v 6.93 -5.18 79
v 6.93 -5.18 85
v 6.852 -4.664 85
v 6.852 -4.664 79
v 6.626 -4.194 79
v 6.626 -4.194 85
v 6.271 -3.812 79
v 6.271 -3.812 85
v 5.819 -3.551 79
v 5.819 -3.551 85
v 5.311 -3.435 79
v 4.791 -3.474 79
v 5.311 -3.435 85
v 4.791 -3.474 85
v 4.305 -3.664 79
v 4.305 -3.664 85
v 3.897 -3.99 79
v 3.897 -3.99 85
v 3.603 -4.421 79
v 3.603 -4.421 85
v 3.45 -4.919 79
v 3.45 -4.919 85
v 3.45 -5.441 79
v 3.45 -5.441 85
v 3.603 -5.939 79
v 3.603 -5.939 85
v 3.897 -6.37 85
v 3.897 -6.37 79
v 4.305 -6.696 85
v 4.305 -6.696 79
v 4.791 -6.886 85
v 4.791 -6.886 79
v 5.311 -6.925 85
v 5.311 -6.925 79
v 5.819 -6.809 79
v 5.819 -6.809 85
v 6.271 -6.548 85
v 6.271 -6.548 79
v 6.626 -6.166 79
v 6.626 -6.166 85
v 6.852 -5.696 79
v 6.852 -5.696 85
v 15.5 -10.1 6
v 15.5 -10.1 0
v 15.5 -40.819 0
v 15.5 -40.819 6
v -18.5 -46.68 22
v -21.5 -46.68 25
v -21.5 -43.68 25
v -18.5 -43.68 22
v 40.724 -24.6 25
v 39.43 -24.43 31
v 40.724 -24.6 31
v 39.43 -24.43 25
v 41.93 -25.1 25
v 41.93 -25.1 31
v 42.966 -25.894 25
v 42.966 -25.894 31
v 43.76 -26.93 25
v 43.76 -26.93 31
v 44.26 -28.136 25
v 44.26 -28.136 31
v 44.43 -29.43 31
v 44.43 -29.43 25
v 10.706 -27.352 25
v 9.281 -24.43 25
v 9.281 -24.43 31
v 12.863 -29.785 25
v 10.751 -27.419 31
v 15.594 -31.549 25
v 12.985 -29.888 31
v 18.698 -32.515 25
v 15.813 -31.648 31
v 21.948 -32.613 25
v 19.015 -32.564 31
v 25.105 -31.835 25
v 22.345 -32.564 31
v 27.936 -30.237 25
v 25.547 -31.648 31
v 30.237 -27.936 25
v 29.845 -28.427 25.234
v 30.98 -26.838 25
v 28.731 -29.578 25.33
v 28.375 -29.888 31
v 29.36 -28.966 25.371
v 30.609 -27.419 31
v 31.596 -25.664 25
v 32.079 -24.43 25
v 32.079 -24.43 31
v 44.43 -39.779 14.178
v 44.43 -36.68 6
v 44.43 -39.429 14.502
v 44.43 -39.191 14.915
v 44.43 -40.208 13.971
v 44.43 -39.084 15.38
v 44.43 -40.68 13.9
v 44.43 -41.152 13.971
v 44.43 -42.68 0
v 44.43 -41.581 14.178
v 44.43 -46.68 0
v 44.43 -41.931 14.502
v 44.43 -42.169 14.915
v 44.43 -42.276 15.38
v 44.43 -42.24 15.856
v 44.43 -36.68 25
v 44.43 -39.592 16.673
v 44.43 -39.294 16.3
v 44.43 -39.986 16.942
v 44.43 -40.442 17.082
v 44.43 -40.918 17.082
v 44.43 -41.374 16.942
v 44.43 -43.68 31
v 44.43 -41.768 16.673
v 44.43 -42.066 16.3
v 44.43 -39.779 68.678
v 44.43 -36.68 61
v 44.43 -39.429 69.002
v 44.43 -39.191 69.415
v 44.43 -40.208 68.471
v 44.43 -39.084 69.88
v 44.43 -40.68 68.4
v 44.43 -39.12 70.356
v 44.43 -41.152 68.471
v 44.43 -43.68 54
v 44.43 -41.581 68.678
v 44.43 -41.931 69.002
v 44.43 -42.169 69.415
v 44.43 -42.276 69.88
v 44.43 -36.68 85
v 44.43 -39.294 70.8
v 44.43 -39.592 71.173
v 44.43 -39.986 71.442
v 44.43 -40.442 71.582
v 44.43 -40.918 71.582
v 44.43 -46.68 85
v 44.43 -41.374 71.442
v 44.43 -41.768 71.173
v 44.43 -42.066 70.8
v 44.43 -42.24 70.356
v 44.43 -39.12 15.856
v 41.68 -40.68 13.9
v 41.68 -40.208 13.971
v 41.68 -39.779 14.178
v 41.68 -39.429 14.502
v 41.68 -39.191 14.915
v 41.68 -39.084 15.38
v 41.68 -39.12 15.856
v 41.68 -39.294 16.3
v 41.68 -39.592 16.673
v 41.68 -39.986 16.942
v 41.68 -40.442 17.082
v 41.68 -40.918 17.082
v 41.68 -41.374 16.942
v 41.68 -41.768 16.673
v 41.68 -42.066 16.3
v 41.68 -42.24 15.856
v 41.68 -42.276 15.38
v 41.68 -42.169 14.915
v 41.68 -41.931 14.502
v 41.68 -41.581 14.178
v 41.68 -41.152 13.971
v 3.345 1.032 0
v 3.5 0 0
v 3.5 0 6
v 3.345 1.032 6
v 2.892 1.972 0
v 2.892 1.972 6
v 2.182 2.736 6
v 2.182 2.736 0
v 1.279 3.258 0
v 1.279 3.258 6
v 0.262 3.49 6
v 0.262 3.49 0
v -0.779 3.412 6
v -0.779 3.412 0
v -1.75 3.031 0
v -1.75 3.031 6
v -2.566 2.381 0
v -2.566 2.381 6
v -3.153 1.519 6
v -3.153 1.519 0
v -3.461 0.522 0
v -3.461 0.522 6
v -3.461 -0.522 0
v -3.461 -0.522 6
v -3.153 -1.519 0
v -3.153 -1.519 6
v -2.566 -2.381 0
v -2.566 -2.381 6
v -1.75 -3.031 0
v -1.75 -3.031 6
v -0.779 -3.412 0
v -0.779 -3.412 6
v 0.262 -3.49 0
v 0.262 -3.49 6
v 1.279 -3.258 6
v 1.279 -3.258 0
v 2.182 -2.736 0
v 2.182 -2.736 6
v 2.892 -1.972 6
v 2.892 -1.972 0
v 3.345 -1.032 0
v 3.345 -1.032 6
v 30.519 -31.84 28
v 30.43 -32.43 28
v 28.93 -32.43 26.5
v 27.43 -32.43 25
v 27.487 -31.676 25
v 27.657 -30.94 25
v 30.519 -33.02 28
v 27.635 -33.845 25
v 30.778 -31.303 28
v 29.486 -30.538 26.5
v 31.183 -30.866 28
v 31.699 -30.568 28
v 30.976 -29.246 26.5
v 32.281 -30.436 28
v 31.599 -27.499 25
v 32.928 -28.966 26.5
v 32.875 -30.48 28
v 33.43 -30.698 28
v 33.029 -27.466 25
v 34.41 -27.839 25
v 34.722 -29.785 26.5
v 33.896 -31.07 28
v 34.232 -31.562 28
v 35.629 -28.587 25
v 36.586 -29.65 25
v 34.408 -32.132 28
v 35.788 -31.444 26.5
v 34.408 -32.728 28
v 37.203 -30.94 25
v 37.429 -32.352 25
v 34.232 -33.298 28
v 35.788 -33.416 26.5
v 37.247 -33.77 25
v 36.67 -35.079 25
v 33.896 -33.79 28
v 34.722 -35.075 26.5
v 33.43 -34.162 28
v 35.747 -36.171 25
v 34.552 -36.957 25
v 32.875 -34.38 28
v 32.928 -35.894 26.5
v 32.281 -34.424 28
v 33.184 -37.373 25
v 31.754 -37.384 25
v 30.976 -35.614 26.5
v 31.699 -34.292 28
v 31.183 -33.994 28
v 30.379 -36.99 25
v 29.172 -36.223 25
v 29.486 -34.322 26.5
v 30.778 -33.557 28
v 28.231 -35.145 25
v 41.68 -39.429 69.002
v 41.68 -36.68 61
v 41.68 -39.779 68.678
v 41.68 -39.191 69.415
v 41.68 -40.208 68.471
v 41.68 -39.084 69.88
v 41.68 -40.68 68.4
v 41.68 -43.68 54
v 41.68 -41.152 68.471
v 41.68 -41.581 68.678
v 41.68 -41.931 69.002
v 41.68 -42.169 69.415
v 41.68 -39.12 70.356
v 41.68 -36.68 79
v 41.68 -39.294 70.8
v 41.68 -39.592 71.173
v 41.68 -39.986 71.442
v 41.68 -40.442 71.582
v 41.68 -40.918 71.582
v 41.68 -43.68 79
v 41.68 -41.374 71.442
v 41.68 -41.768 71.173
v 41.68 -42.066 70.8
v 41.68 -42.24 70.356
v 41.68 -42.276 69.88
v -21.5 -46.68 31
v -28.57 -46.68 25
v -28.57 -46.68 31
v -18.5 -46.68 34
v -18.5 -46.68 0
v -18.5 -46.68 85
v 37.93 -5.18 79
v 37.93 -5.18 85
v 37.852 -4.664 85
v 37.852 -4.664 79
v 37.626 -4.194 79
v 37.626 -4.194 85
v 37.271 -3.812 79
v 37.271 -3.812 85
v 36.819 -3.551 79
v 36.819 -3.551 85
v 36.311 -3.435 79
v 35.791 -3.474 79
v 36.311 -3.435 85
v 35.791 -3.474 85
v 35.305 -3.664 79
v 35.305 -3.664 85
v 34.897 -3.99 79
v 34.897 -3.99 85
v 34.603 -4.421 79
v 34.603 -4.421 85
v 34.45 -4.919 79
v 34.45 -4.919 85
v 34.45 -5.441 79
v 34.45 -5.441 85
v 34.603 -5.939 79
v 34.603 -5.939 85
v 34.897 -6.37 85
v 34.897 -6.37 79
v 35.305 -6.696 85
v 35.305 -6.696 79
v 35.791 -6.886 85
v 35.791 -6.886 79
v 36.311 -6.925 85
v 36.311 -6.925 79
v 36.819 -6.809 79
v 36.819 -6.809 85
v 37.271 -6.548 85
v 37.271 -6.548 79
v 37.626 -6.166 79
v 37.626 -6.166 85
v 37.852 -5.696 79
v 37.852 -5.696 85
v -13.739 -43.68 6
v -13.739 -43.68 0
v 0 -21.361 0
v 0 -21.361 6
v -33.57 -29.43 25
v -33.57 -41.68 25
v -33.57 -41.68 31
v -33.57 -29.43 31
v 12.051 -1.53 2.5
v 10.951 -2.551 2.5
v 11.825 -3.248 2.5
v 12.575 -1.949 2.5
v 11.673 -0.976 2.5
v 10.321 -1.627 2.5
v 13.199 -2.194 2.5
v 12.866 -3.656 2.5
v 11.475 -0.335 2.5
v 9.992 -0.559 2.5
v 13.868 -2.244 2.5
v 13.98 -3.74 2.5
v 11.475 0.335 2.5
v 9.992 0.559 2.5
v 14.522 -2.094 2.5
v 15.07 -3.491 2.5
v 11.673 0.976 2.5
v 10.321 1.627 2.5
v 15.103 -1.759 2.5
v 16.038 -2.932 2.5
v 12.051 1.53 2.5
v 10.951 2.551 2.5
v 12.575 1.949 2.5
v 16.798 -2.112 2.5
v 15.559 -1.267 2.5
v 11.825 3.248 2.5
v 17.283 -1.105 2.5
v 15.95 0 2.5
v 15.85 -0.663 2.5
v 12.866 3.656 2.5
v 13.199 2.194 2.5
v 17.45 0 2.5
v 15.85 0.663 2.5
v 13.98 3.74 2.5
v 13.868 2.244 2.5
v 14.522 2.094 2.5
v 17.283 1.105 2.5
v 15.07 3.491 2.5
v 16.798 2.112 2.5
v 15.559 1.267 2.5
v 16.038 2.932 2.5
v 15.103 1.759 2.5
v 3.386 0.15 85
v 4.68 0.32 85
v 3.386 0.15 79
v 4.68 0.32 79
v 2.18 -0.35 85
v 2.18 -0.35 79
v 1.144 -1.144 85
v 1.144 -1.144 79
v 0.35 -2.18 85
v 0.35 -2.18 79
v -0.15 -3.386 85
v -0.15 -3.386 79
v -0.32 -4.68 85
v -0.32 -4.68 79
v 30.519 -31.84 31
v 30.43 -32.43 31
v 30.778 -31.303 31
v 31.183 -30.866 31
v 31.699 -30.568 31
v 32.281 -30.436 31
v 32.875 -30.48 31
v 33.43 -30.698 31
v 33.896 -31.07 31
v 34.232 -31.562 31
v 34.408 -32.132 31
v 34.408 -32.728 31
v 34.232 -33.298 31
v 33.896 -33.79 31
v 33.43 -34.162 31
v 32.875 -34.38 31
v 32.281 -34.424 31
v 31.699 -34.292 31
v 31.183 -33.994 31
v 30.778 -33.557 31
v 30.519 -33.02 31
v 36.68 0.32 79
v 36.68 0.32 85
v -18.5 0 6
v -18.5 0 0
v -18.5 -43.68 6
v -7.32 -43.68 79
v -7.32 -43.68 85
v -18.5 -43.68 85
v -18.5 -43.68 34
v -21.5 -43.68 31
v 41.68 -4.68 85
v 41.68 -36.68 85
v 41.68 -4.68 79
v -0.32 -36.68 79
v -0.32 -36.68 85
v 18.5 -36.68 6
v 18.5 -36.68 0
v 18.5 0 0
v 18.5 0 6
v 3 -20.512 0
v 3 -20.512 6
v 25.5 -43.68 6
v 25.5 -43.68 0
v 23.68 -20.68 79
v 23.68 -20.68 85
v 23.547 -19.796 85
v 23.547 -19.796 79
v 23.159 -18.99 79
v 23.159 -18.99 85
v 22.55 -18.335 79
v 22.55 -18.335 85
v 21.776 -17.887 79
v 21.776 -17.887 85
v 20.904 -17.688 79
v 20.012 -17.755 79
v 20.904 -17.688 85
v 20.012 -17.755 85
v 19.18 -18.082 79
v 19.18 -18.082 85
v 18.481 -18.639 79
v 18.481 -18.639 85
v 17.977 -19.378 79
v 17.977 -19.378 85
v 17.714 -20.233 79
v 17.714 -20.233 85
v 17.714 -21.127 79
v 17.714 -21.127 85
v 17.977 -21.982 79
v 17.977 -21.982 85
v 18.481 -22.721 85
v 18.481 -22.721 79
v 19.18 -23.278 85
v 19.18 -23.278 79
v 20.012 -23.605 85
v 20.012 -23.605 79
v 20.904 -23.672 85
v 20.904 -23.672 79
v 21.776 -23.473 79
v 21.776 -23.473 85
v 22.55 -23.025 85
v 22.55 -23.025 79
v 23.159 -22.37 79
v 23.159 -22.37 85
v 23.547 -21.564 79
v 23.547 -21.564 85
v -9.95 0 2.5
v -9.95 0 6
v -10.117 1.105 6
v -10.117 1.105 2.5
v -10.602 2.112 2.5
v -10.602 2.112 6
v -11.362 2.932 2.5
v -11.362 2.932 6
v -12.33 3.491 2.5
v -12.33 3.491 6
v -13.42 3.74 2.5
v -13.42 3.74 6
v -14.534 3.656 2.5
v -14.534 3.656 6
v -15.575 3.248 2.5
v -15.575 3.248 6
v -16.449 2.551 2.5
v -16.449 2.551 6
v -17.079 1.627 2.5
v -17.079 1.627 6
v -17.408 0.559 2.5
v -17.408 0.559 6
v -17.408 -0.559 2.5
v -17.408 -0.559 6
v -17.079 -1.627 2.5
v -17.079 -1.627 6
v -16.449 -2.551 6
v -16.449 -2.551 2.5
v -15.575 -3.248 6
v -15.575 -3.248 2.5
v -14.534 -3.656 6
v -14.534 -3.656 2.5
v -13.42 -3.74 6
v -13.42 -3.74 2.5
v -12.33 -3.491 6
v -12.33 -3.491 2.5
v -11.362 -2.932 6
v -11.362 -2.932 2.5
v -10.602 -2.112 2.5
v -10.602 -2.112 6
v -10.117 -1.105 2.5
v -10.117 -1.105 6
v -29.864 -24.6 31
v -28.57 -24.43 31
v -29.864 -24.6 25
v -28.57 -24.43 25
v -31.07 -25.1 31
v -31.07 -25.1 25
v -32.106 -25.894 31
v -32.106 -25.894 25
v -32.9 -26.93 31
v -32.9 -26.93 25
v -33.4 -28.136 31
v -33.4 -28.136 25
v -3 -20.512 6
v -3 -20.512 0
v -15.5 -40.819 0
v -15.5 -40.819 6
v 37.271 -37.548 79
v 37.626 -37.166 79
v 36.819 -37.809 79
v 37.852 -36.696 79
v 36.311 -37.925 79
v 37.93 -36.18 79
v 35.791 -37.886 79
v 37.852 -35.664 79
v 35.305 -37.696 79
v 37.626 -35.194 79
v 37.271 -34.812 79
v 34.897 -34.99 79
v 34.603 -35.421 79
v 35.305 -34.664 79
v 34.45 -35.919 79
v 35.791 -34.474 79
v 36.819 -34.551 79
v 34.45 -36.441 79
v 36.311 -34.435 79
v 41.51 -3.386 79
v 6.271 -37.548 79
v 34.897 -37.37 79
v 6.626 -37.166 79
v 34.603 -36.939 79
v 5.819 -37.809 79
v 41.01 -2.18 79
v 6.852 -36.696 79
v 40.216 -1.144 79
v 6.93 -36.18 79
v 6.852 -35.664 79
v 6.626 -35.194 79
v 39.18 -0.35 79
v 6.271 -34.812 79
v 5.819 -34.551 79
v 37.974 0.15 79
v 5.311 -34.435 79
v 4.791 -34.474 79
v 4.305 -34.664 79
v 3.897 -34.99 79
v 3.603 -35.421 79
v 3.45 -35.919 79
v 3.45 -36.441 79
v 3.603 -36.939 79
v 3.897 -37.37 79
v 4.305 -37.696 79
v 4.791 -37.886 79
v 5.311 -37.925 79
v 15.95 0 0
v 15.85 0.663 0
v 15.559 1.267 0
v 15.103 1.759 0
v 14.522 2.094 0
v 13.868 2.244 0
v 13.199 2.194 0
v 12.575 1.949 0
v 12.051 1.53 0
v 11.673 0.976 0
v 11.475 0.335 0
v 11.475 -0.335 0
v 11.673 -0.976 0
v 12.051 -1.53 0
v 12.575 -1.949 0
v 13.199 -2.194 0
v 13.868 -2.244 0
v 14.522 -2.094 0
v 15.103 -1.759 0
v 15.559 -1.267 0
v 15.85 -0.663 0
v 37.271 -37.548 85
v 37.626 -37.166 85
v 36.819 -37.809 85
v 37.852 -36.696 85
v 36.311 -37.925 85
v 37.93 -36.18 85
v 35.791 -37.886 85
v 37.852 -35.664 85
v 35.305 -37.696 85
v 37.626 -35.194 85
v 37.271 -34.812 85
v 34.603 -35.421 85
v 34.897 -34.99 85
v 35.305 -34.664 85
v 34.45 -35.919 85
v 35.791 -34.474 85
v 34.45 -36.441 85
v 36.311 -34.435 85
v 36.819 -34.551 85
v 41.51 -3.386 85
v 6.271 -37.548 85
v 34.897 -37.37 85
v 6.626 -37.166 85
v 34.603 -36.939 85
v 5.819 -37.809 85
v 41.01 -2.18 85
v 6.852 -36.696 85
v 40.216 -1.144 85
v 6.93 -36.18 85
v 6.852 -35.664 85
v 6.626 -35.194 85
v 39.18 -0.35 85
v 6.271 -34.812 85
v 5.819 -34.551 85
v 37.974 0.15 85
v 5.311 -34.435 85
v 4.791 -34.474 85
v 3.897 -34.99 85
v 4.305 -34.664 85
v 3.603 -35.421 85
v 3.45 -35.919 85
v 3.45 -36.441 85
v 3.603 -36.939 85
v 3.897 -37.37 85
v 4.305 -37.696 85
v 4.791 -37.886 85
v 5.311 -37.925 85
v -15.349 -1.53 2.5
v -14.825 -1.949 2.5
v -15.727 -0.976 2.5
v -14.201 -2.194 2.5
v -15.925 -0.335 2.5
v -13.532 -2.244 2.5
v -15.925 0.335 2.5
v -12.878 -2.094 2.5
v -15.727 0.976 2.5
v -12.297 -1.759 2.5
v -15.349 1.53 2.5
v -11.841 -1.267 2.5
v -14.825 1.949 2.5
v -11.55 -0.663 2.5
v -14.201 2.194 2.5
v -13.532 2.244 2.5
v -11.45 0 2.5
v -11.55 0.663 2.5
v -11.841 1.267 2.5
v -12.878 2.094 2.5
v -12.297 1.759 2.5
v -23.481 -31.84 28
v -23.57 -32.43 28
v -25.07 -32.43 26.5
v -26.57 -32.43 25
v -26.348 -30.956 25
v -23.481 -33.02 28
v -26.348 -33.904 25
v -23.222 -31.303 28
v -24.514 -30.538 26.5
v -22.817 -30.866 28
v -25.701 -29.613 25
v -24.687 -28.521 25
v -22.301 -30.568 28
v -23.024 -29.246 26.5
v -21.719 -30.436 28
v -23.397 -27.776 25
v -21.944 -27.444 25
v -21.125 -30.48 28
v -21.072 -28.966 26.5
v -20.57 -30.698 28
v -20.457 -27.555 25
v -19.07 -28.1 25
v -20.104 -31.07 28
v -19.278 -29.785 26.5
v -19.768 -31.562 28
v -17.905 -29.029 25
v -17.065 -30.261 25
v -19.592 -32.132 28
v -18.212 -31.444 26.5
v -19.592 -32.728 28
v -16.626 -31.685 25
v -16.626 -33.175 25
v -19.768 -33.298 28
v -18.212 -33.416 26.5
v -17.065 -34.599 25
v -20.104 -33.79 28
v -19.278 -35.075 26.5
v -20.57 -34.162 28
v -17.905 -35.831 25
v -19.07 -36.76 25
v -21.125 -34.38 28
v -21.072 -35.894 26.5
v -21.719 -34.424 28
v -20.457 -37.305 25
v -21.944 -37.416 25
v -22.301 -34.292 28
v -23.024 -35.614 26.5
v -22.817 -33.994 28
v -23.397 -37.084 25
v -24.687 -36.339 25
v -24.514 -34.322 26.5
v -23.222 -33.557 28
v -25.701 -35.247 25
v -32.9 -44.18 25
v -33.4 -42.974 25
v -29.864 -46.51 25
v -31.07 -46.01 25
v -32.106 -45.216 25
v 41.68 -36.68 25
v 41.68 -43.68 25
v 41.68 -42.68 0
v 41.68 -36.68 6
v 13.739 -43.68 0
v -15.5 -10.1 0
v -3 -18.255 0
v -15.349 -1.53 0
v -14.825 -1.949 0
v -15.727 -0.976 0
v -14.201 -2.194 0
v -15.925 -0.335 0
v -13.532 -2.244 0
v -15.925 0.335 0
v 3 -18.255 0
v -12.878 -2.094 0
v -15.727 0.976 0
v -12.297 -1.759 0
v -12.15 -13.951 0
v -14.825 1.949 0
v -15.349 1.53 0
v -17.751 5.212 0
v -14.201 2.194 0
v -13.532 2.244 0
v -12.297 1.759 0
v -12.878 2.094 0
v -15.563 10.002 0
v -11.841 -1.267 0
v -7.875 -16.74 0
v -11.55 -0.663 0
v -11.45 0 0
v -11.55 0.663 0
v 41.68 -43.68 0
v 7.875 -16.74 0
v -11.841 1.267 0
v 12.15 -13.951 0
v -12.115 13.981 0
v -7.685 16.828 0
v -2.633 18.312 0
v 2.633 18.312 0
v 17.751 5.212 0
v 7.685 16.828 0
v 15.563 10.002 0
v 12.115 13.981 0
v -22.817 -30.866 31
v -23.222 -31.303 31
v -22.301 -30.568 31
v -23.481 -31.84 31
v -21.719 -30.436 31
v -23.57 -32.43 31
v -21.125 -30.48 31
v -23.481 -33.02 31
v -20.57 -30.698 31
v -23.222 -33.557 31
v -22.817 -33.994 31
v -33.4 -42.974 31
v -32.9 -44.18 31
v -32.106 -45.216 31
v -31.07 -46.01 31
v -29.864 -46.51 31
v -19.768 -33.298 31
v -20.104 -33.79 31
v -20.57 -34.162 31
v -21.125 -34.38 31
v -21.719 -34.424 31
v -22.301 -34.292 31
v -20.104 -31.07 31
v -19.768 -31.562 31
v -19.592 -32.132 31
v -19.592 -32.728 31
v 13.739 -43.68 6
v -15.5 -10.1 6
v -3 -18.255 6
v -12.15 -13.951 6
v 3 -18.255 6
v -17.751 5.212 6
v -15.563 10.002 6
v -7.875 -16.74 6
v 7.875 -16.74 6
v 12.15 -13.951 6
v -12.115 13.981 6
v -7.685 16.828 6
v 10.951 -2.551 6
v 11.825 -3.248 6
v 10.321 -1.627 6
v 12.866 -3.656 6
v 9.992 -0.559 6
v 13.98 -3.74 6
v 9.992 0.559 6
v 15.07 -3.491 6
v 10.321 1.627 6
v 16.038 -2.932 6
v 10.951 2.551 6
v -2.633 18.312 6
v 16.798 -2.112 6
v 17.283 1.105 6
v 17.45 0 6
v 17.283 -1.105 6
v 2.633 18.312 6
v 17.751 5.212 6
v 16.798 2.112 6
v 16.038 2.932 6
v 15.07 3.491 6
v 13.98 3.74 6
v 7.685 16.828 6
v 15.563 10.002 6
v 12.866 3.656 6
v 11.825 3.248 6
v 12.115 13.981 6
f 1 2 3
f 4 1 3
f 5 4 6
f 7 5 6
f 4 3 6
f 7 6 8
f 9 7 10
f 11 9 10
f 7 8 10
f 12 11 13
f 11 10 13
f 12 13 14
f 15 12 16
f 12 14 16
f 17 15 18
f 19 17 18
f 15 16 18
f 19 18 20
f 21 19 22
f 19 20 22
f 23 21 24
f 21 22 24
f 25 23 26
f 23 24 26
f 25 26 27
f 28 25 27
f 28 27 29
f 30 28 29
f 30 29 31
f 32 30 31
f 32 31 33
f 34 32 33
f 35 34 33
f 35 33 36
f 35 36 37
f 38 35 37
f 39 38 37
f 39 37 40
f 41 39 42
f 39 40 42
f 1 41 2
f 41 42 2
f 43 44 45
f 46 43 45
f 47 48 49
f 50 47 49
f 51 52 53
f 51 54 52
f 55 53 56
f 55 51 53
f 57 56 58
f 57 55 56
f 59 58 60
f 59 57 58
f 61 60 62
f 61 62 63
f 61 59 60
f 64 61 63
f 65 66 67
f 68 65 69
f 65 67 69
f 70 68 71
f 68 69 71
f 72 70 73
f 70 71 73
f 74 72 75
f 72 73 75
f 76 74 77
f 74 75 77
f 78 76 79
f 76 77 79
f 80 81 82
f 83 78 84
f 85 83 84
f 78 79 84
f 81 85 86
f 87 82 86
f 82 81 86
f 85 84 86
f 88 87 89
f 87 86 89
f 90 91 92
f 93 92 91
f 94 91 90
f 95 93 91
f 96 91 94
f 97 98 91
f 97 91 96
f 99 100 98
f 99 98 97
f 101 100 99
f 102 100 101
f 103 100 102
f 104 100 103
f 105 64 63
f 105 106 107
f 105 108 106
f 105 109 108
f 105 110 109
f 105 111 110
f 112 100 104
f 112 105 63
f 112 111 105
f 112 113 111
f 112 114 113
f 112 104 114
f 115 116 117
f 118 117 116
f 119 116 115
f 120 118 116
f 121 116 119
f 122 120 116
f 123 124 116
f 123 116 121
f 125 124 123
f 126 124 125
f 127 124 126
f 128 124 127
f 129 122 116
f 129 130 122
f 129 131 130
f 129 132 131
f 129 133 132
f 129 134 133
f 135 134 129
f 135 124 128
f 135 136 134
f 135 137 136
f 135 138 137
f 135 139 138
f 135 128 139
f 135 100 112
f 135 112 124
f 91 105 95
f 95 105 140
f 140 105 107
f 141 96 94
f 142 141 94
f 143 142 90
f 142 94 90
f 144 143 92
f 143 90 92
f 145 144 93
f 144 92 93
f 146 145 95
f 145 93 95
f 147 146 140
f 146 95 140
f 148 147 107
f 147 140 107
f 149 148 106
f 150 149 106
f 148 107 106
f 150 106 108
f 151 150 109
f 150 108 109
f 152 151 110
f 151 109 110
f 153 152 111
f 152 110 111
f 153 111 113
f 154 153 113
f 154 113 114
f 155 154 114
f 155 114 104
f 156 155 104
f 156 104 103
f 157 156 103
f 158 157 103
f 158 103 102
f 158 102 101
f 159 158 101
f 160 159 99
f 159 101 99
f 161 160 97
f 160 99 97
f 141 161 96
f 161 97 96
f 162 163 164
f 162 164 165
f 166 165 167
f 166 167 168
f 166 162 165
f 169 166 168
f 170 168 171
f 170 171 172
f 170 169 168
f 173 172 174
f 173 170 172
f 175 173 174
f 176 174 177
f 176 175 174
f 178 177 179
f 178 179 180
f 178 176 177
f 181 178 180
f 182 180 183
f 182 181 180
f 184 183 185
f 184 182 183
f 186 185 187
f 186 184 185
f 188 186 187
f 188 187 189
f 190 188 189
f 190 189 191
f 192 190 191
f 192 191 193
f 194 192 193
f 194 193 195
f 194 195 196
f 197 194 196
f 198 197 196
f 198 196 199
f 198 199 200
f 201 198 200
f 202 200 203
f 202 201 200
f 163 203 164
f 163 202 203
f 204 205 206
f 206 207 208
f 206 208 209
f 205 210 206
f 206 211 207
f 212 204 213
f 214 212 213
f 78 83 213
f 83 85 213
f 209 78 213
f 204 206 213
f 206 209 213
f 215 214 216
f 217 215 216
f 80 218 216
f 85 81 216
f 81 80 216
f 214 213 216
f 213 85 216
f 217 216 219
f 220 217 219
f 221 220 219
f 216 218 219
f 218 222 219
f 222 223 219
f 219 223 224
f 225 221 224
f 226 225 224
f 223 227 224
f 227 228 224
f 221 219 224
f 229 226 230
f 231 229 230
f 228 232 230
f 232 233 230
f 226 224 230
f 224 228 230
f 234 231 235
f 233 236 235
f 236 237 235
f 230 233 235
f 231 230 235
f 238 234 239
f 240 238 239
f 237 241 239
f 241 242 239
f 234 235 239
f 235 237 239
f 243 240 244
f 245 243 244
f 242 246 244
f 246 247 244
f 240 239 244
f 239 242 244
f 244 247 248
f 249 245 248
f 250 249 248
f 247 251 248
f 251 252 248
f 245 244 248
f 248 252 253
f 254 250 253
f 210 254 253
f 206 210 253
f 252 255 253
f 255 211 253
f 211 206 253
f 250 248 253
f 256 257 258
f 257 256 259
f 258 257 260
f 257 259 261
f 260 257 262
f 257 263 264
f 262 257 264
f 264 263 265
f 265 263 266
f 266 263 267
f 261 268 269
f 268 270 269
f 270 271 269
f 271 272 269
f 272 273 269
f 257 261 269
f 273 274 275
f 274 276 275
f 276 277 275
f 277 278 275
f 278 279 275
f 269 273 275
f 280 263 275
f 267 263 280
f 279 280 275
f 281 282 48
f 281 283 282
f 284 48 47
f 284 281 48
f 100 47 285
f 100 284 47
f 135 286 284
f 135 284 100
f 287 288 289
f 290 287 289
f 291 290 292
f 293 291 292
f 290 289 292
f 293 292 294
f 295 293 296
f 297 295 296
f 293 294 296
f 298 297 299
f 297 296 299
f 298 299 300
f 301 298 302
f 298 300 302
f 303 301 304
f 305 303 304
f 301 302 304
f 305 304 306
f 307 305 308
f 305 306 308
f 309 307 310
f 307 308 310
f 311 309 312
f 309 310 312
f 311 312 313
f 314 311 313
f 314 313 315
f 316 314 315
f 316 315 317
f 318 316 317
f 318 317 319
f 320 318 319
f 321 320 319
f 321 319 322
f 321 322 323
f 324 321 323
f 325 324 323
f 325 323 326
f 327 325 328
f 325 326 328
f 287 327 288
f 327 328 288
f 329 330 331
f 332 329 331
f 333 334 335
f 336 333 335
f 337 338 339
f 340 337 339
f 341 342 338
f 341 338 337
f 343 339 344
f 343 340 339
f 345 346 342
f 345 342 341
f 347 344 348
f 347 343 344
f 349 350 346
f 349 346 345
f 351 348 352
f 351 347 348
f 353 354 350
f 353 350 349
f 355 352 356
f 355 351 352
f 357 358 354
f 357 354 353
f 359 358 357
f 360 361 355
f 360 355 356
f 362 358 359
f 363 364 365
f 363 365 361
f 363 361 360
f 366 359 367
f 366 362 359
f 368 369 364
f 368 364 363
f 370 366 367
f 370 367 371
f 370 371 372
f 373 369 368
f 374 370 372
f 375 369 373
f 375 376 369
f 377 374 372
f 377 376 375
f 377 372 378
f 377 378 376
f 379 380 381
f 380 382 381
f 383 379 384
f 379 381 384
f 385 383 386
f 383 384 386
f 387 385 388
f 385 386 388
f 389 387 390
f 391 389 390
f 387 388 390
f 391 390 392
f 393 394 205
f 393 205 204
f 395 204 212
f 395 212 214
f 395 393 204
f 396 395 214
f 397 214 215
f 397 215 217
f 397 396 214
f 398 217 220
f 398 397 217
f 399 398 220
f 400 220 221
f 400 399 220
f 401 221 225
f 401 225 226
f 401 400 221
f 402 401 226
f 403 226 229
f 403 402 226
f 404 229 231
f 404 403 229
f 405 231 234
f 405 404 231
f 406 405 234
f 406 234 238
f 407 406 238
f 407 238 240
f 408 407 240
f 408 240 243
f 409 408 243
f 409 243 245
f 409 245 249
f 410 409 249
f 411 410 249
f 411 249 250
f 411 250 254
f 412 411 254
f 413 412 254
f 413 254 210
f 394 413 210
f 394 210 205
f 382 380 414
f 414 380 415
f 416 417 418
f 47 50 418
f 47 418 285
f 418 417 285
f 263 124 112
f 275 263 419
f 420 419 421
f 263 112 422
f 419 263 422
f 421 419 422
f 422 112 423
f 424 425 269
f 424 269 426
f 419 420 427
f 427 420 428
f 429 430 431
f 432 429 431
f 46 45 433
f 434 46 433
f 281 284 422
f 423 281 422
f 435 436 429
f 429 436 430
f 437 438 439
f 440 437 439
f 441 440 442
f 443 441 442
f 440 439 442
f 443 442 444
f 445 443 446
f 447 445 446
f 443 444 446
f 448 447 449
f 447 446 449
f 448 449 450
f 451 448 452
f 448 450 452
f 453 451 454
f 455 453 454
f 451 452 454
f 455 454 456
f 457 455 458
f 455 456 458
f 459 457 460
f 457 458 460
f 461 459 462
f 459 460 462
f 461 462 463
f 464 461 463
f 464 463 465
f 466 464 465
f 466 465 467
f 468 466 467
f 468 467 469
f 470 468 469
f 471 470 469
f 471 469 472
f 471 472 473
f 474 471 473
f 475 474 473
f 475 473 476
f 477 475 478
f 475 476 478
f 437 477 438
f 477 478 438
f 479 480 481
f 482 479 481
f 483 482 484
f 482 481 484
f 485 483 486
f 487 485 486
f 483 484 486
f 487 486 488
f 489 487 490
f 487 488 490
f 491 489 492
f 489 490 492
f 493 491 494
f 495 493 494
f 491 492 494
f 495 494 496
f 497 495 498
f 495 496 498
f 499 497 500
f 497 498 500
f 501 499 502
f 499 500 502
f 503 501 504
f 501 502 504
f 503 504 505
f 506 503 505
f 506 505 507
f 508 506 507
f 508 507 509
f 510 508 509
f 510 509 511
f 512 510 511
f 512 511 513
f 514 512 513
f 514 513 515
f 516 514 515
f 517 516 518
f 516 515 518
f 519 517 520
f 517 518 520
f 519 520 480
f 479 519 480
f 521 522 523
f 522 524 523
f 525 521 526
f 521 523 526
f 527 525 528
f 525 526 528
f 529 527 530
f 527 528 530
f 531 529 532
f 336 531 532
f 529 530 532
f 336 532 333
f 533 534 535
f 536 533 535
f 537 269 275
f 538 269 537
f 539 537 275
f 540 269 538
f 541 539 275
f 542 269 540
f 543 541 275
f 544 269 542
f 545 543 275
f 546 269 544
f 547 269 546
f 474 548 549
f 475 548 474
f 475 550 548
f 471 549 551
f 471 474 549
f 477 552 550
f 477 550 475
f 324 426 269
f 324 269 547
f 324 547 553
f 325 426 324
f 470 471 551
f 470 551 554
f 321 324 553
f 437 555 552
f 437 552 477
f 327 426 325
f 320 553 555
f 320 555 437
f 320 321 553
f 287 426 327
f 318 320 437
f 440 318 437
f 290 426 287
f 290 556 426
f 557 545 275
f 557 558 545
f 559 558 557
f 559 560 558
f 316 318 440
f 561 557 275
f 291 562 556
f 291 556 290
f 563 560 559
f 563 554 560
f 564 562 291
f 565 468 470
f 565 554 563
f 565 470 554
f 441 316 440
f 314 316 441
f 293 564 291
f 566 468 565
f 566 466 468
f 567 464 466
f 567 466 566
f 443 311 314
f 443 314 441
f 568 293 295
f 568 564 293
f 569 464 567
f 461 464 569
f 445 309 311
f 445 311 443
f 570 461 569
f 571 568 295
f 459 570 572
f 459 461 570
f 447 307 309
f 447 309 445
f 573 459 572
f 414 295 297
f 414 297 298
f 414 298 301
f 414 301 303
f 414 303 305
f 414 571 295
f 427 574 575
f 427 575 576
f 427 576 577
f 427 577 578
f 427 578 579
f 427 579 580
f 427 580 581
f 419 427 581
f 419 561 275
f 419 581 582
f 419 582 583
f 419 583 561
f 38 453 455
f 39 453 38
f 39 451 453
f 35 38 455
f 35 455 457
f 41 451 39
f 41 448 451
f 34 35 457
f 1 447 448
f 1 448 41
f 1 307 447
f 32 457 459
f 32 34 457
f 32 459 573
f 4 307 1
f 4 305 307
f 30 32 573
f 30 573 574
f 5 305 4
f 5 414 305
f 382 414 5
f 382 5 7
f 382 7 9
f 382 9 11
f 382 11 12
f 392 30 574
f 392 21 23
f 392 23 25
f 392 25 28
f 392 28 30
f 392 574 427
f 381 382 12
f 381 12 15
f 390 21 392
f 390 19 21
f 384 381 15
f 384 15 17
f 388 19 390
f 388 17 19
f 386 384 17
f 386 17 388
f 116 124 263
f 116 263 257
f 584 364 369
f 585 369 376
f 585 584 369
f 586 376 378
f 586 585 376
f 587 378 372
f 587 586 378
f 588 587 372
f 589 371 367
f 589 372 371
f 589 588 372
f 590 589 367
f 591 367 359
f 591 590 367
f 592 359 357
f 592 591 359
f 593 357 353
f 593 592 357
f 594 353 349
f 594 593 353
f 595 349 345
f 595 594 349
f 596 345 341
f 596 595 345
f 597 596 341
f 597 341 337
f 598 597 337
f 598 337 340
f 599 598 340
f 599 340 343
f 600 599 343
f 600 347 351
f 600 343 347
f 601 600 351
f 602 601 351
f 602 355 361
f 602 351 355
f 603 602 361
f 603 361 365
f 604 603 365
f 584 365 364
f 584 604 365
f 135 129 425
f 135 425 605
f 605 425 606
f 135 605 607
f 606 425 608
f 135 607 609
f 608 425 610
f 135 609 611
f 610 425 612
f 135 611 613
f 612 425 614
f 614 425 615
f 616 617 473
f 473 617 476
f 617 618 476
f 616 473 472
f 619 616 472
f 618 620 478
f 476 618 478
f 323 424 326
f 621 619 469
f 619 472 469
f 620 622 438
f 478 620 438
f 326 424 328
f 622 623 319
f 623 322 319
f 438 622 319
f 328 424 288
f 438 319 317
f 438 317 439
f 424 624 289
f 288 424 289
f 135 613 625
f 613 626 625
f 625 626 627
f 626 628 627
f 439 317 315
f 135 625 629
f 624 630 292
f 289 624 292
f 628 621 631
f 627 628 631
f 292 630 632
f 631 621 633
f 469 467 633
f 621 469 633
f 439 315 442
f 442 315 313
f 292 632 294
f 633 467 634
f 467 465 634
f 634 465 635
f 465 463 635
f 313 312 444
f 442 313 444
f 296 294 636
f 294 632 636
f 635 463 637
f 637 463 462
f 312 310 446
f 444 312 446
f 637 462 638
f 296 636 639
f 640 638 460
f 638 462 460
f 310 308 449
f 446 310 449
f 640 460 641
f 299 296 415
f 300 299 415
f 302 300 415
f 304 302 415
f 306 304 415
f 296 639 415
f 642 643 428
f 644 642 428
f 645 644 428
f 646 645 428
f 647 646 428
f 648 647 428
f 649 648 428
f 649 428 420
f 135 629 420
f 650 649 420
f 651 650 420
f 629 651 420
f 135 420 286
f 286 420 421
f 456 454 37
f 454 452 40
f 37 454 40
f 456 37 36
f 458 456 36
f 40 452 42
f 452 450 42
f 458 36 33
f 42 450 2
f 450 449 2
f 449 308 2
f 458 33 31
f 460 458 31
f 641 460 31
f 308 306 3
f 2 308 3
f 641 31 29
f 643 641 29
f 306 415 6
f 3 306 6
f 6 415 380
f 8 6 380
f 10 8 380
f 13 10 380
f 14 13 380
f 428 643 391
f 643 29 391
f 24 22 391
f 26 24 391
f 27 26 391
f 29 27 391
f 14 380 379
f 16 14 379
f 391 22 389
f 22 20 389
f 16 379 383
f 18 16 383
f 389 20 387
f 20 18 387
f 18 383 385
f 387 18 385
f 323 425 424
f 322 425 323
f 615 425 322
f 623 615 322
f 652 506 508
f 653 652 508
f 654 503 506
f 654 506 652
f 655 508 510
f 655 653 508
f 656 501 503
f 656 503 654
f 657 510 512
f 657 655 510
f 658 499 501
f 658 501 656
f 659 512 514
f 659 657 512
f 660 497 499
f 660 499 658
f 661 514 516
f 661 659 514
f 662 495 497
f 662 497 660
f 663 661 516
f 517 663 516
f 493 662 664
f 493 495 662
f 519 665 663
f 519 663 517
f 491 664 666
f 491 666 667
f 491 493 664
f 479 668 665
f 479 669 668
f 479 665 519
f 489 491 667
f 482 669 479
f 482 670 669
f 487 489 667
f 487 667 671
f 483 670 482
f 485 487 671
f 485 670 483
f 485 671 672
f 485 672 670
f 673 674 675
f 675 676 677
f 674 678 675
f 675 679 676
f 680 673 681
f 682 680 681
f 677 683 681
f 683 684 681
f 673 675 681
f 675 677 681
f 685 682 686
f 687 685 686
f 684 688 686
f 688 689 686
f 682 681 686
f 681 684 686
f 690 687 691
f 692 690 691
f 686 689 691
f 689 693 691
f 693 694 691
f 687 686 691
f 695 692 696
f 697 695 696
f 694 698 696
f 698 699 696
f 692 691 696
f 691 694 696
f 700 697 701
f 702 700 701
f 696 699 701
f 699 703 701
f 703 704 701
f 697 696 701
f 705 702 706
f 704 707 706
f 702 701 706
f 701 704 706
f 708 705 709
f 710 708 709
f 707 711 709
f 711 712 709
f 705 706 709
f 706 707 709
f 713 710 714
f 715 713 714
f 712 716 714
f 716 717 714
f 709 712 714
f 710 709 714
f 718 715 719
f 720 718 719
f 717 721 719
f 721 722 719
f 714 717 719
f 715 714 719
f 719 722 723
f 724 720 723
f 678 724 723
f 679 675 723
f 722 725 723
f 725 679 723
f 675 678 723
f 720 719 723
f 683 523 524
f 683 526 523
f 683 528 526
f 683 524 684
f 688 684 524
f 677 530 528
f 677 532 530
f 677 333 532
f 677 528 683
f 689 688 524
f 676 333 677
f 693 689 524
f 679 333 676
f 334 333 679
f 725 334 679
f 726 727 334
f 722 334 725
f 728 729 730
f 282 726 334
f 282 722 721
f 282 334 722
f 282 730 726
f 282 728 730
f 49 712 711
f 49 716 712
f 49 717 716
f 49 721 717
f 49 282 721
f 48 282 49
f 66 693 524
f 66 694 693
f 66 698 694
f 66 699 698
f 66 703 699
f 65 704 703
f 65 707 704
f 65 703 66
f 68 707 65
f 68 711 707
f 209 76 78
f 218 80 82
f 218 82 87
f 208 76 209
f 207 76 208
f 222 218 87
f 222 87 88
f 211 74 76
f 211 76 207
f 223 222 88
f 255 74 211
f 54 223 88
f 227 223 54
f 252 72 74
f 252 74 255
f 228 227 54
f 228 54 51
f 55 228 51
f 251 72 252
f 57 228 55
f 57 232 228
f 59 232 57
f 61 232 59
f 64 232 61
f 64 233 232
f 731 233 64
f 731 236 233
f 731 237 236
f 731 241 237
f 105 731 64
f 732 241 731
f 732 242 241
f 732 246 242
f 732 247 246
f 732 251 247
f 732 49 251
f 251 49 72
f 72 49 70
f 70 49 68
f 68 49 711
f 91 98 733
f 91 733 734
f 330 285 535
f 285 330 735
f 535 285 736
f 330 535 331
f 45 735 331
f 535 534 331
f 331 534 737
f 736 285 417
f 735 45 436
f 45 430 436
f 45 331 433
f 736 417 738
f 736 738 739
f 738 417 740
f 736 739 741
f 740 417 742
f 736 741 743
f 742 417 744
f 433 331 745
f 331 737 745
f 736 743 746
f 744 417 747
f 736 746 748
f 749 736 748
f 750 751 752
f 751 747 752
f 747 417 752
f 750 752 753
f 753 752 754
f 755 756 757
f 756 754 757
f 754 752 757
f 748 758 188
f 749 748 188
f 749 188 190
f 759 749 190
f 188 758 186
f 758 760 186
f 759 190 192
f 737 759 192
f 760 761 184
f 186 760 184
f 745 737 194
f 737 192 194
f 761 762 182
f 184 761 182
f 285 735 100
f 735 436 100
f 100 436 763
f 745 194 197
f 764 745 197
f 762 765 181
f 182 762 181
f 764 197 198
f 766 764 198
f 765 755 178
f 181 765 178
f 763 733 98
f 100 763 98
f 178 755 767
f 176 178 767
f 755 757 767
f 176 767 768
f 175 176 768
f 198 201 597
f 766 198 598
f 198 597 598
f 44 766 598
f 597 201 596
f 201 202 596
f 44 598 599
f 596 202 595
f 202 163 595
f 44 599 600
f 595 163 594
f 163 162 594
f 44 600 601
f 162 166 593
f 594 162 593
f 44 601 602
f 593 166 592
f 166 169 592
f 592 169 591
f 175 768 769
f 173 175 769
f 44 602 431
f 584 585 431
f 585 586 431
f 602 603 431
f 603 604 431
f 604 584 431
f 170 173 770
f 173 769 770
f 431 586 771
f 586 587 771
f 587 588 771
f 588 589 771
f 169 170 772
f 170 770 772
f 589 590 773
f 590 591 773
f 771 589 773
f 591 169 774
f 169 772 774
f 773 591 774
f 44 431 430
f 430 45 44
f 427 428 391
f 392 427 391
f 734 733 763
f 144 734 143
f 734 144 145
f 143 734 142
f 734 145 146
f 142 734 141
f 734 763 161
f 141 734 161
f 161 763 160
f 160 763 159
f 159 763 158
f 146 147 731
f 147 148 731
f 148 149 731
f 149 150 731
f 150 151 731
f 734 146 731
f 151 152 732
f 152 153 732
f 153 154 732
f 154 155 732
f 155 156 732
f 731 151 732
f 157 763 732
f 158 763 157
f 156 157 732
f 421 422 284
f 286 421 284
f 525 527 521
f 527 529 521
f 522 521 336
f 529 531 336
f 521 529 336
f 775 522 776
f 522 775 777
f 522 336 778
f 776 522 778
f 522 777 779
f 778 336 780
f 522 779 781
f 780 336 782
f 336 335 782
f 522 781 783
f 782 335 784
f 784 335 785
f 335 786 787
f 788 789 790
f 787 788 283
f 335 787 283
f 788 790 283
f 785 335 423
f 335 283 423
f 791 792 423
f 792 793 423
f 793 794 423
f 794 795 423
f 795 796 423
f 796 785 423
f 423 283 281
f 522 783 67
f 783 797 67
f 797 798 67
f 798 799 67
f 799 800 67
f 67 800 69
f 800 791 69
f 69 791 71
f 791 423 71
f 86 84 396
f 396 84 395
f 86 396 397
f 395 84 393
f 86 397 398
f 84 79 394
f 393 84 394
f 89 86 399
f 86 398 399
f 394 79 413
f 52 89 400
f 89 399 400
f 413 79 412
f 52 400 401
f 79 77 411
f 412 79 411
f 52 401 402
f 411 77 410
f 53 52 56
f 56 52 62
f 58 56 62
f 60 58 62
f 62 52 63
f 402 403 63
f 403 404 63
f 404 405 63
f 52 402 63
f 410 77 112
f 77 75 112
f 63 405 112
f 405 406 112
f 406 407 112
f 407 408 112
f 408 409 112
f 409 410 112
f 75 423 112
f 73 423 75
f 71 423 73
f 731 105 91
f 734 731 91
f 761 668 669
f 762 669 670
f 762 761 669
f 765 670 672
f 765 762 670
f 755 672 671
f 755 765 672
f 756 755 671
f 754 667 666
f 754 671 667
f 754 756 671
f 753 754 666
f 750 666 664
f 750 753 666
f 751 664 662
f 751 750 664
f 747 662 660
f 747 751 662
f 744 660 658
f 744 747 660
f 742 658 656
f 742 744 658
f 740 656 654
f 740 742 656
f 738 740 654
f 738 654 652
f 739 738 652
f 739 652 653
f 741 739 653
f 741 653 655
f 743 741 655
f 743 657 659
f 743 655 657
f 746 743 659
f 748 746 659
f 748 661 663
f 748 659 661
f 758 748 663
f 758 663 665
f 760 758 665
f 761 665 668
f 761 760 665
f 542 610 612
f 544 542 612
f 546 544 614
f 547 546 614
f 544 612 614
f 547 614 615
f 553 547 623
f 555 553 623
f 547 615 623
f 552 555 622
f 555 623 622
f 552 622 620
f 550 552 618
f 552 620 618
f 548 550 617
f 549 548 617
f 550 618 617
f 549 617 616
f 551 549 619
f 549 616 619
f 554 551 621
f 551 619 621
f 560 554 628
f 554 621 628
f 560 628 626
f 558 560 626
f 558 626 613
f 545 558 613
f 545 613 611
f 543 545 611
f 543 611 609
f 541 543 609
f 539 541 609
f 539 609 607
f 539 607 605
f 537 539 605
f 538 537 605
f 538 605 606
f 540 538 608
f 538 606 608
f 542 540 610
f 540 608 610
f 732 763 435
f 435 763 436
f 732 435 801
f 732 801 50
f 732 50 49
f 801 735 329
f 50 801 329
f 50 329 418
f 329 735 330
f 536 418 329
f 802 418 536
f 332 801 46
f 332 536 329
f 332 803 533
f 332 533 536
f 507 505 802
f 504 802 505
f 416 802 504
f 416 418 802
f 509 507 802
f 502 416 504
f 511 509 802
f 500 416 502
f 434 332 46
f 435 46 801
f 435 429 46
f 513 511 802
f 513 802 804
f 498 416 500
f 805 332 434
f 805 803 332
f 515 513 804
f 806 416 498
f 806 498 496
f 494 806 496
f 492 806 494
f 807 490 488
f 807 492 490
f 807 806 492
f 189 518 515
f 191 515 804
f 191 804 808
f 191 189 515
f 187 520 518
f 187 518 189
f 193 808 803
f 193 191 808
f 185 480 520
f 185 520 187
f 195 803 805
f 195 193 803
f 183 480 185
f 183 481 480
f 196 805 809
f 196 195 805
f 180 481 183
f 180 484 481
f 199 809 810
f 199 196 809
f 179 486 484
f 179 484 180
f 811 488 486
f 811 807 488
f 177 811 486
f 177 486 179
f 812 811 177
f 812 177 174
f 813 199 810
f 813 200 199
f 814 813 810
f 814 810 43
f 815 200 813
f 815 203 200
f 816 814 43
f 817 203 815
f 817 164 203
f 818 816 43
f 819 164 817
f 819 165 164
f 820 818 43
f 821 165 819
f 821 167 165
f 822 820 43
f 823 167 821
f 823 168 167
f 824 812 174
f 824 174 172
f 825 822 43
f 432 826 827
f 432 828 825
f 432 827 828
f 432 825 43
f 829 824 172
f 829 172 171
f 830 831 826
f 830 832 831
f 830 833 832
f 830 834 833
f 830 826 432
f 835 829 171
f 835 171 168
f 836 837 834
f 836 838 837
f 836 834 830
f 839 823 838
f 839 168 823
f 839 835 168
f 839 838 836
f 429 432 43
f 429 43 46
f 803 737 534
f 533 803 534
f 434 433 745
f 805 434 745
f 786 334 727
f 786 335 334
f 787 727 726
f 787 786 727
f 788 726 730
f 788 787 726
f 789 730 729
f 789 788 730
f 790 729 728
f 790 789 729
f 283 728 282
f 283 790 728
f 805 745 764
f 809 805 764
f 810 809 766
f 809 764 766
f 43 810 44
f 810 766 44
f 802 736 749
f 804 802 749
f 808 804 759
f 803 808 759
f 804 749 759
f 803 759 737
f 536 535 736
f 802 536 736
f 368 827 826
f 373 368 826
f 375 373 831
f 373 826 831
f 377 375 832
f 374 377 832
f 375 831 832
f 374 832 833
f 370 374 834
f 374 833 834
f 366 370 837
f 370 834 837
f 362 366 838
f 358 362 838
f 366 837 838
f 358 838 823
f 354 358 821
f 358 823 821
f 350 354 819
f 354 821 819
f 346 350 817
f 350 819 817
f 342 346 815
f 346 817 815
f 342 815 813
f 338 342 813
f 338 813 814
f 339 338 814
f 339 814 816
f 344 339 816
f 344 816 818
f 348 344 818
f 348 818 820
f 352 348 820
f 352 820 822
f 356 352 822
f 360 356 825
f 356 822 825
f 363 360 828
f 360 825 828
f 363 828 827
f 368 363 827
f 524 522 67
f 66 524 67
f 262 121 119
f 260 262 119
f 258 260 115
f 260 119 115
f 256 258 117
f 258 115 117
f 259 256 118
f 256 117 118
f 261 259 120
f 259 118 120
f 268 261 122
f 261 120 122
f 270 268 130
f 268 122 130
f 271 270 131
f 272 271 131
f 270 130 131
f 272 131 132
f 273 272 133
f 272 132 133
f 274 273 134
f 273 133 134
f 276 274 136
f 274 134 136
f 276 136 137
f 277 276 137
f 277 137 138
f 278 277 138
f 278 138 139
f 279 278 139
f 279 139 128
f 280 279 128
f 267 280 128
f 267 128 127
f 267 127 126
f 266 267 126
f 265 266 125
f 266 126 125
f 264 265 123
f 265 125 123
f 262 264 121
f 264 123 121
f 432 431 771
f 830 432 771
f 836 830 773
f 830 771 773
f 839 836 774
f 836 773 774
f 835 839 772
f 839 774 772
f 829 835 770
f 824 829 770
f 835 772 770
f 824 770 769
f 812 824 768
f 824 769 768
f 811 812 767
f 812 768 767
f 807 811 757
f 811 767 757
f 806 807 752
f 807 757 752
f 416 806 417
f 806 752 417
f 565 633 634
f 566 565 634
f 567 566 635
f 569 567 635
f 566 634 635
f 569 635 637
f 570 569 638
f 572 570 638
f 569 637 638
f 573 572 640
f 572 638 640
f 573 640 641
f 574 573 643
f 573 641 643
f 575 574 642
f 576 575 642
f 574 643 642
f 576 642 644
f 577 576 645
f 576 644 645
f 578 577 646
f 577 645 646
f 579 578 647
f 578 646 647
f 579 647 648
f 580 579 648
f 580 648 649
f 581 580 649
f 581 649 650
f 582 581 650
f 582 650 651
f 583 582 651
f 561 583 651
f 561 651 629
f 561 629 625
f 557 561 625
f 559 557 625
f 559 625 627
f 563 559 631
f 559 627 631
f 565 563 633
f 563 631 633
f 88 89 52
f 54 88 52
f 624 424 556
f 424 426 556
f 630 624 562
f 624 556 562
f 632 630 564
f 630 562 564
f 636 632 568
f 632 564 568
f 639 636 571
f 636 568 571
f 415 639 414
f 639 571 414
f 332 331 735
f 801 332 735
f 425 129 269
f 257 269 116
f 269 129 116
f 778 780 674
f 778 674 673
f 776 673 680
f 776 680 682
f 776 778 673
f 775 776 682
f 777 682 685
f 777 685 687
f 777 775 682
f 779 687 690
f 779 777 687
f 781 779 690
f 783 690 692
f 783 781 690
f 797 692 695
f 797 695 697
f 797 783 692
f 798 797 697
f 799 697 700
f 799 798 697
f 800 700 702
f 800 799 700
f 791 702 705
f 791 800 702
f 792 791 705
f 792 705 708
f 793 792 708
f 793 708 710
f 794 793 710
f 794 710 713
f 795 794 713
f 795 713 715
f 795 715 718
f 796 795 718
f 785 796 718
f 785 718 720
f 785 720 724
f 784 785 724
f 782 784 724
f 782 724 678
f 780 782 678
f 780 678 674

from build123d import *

# Parameters (mm, degrees)
SKETCH1_R           = 18.5
SKETCH1_R_2         = 3.5
SKETCH1_R_3         = 2.25
BOSS_EXTRUDE1_DEPTH = 6
SKETCH2_R           = 3.75
CUT_EXTRUDE1_DEPTH  = 3.5
BOSS_EXTRUDE2_START = -6
BOSS_EXTRUDE2_DEPTH = 6
SKETCH4_W           = 62.93
SKETCH4_H           = 3
BOSS_EXTRUDE3_DEPTH = 85
SKETCH6_R           = 2
BOSS_EXTRUDE5_DEPTH = 6
SKETCH5_W           = 42
SKETCH5_H           = 44
SKETCH5_R           = 1.75
SKETCH5_R_2         = 3
BOSS_EXTRUDE4_DEPTH = 6
SKETCH7_W           = 15.07
SKETCH7_H           = 6
BOSS_EXTRUDE6_DEPTH = 3
CHAMFER1_SIZE       = 3
SKETCH8_W           = 6
SKETCH8_H           = 7
SKETCH8_W_2         = 18
SKETCH8_R           = 1.6
SKETCH8_W_3         = 19
BOSS_EXTRUDE7_DEPTH = 2.75
CHAMFER2_SIZE       = 7
FILLET1_R           = 5
CHAMFER3_SIZE       = 3


with BuildPart() as part:
    # Sketch1 → Boss-Extrude1 (new body)
    with BuildSketch(Plane.XY):
        Circle(SKETCH1_R)
        Circle(SKETCH1_R_2, mode=Mode.SUBTRACT)
        with Locations((-13.7, 0)):
            Circle(SKETCH1_R_3, mode=Mode.SUBTRACT)
        with Locations((13.7, 0)):
            Circle(SKETCH1_R_3, mode=Mode.SUBTRACT)
    extrude(amount=BOSS_EXTRUDE1_DEPTH)

    # Sketch2 → Cut-Extrude1 (cut)
    with BuildSketch(Plane.XY.offset(6)):
        with Locations((-13.7, 0)):
            Circle(SKETCH2_R)
        with Locations((13.7, 0)):
            Circle(SKETCH2_R)
    extrude(amount=-CUT_EXTRUDE1_DEPTH, mode=Mode.SUBTRACT)

    # Sketch3 → Boss-Extrude2 (add)
    with BuildSketch(Plane.XY.offset(6).offset(BOSS_EXTRUDE2_START)):
        with BuildLine():
            ThreePointArc((-15.5, -10.099504938), (-17.734147851, -5.267826876), (-18.5, 0))
            Line((-18.5, 0), (-18.5, -46.68))
            Line((-18.5, -46.68), (18.5, -46.68))
            Line((18.5, -46.68), (18.5, 0))
            ThreePointArc((18.5, 0), (17.734147851, -5.267826876), (15.5, -10.099504938))
            Line((15.5, -10.099504938), (15.5, -40.818554828))
            Line((15.5, -40.818554828), (15.5, -43.68))
            Line((15.5, -43.68), (13.738586173, -43.68))
            Line((13.738586173, -43.68), (-13.738586173, -43.68))
            Line((-13.738586173, -43.68), (-15.5, -43.68))
            Line((-15.5, -43.68), (-15.5, -40.818554828))
            Line((-15.5, -40.818554828), (-15.5, -10.099504938))
        make_face()
        with BuildLine():
            Line((-3, -20.512103215), (-15.5, -40.818554828))
            Line((-15.5, -40.818554828), (-15.5, -43.68))
            Line((-15.5, -43.68), (-13.738586173, -43.68))
            Line((-13.738586173, -43.68), (0, -21.361445172))
            Line((0, -21.361445172), (13.738586173, -43.68))
            Line((13.738586173, -43.68), (15.5, -43.68))
            Line((15.5, -43.68), (15.5, -40.818554828))
            Line((15.5, -40.818554828), (3, -20.512103215))
            Line((3, -20.512103215), (1.71251735, -18.420566884))
            ThreePointArc((1.71251735, -18.420566884), (0, -18.5), (-1.71251735, -18.420566884))
            Line((-1.71251735, -18.420566884), (-3, -20.512103215))
        make_face()
        with BuildLine():
            Line((3, -20.512103215), (3, -18.255136264))
            ThreePointArc((3, -18.255136264), (2.357710068, -18.349147207), (1.71251735, -18.420566884))
            Line((1.71251735, -18.420566884), (3, -20.512103215))
        make_face()
        with BuildLine():
            ThreePointArc((-1.71251735, -18.420566884), (-2.357710068, -18.349147207), (-3, -18.255136264))
            Line((-3, -18.255136264), (-3, -20.512103215))
            Line((-3, -20.512103215), (-1.71251735, -18.420566884))
        make_face()
    extrude(amount=BOSS_EXTRUDE2_DEPTH)

    # Sketch4 → Boss-Extrude3 (add)
    with BuildSketch(Plane.XY):
        with Locations((12.965, -45.18)):
            Rectangle(SKETCH4_W, SKETCH4_H)
    extrude(amount=BOSS_EXTRUDE3_DEPTH)

    # Sketch6 → Boss-Extrude5 (add)
    with BuildSketch(Plane(origin=(0, 0, 31), x_dir=(-1, 0, 0), z_dir=(0, 0, -1))):
        with BuildLine():
            Line((-44.43, -24.43), (-44.43, -43.68))
            Line((-44.43, -43.68), (33.57, -43.68))
            Line((33.57, -43.68), (33.57, -24.43))
            Line((33.57, -24.43), (-9.280986885, -24.43))
            ThreePointArc((-9.280986885, -24.43), (-20.68, -32.68), (-32.079013115, -24.43))
            Line((-32.079013115, -24.43), (-44.43, -24.43))
        make_face()
        with Locations((-32.43, -32.43)):
            Circle(SKETCH6_R, mode=Mode.SUBTRACT)
        with Locations((21.57, -32.43)):
            Circle(SKETCH6_R, mode=Mode.SUBTRACT)
    extrude(amount=BOSS_EXTRUDE5_DEPTH)

    # Sketch5 → Boss-Extrude4 (add)
    with BuildSketch(Plane.XY.offset(85)):
        with Locations((20.68, -21.68)):
            Rectangle(SKETCH5_W, SKETCH5_H)
        with Locations((5.18, -36.18)):
            Circle(SKETCH5_R, mode=Mode.SUBTRACT)
        with Locations((36.18, -36.18)):
            Circle(SKETCH5_R, mode=Mode.SUBTRACT)
        with Locations((5.18, -5.18)):
            Circle(SKETCH5_R, mode=Mode.SUBTRACT)
        with Locations((20.68, -20.68)):
            Circle(SKETCH5_R_2, mode=Mode.SUBTRACT)
        with Locations((36.18, -5.18)):
            Circle(SKETCH5_R, mode=Mode.SUBTRACT)
    extrude(amount=-BOSS_EXTRUDE4_DEPTH)

    # Sketch7 → Boss-Extrude6 (add)
    with BuildSketch(Plane.XZ.offset(46.68)):
        with Locations((-26.035, 28)):
            Rectangle(SKETCH7_W, SKETCH7_H)
    extrude(amount=-BOSS_EXTRUDE6_DEPTH)

    # Chamfer1
    chamfer1_edges = [part.edges().sort_by_distance(p)[0] for p in [
        (-18.5, -45.18, 31),
        (-18.5, -45.18, 25),
    ]]
    chamfer(chamfer1_edges, length=CHAMFER1_SIZE)

    # Sketch8 → Boss-Extrude7 (add)
    # profile 1 of 3: a face of its own
    with BuildSketch(Plane(origin=(44.43, 0, 0), x_dir=(0, 0, -1), z_dir=(1, 0, 0))):
        with Locations((-82, -40.18)):
            Rectangle(SKETCH8_W, SKETCH8_H)
    # profile 2 of 3: a face of its own
    with BuildSketch(Plane(origin=(44.43, 0, 0), x_dir=(0, 0, -1), z_dir=(1, 0, 0))):
        with Locations((-70, -40.18)):
            Rectangle(SKETCH8_W_2, SKETCH8_H)
        with Locations((-70, -40.68)):
            Circle(SKETCH8_R, mode=Mode.SUBTRACT)
    # profile 3 of 3: a face of its own
    with BuildSketch(Plane(origin=(44.43, 0, 0), x_dir=(0, 0, -1), z_dir=(1, 0, 0))):
        with Locations((-15.5, -40.18)):
            Rectangle(SKETCH8_W_3, SKETCH8_H)
        with Locations((-15.5, -40.68)):
            Circle(SKETCH8_R, mode=Mode.SUBTRACT)
    extrude(amount=-BOSS_EXTRUDE7_DEPTH)

    # Chamfer2
    # the kernel refuses this chamfer: 7 mm, written as the material it adds along each edge
    with BuildSketch(Plane(origin=(-0.32, -43.68, 85), x_dir=(-0.9996219169112968, -0.02749587661058612, 0), z_dir=(0, 0, -1)), Plane(origin=(18.5, -43.68, 0), x_dir=(0.9996219169112968, -0.027495876610586112, 0), z_dir=(0, 0, 1))) as chamfer2_piece_1:
        Polygon((CHAMFER2_SIZE * 0.999621916911, CHAMFER2_SIZE * 0.0274958766106), (-CHAMFER2_SIZE * 0.0274958766106, CHAMFER2_SIZE * 0.999621916911), (0, 0), align=None)
    extrude(amount=6)
    with BuildSketch(Plane(origin=(44.43, -43.68, 6), x_dir=(0, -0.02749587661058612, -0.9996219169112968), z_dir=(-1, 0, 0))) as chamfer2_piece_2_section:
        Polygon((CHAMFER2_SIZE * 0.999621916911, -CHAMFER2_SIZE * 0.0274958766106), (-CHAMFER2_SIZE * 0.0274958766106, -CHAMFER2_SIZE * 0.999621916911), (0, 0), align=None)
    chamfer2_piece_2 = extrude(amount=2.75, mode=Mode.PRIVATE)
    chamfer2_piece_2 = split(chamfer2_piece_2, bisect_by=Plane(origin=(43.055, -41.310788547, 0), z_dir=(0, 0, 1)), keep=Keep.TOP, mode=Mode.PRIVATE)
    chamfer2_piece_2 = split(chamfer2_piece_2, bisect_by=Plane(origin=(43.055, -36.68, 3.818532593), z_dir=(0, -1, 0)), keep=Keep.TOP, mode=Mode.PRIVATE)
    add(chamfer2_piece_2)
    with BuildSketch(Plane(origin=(44.43, -43.68, 61), x_dir=(0, -0.027495876610586126, -0.9996219169112968), z_dir=(-1, 0, 0))) as chamfer2_piece_3_section:
        Polygon((CHAMFER2_SIZE * 0.999621916911, -CHAMFER2_SIZE * 0.0274958766106), (-CHAMFER2_SIZE * 0.0274958766106, -CHAMFER2_SIZE * 0.999621916911), (0, 0), align=None)
    chamfer2_piece_3 = extrude(amount=2.75, mode=Mode.PRIVATE)
    chamfer2_piece_3 = split(chamfer2_piece_3, bisect_by=Plane(origin=(43.055, -36.68, 58.68717092), z_dir=(0, -1, 0)), keep=Keep.TOP, mode=Mode.PRIVATE)
    add(chamfer2_piece_3)

    # Fillet1
    fillet1_edges = [part.edges().sort_by_distance(p)[0] for p in [
        (44.43, -24.43, 28),
        (-33.57, -24.43, 28),
        (-0.32, 0.32, 82),
        (41.68, 0.32, 82),
        (-33.57, -46.68, 28),
    ]]
    fillet(fillet1_edges, radius=FILLET1_R)

    # Chamfer3
    # the kernel refuses this chamfer: 3 mm, written as the material it takes off along each edge
    with BuildSketch(Plane(origin=(-21.57, -32.43, 25), x_dir=(-1, 0, 0), z_dir=(0, -1, 0))) as chamfer3_piece_1:
        Polygon((2, -CHAMFER3_SIZE), (2 + CHAMFER3_SIZE, 0), (2, 0), align=None)
    revolve(axis=Axis((-21.57, -32.43, 25), (0, 0, -1)), mode=Mode.SUBTRACT)
    with BuildSketch(Plane(origin=(32.43, -32.43, 25), x_dir=(-1, 0, 0), z_dir=(0, -1, 0))) as chamfer3_piece_2:
        Polygon((2, -CHAMFER3_SIZE), (2 + CHAMFER3_SIZE, 0), (2, 0), align=None)
    revolve(axis=Axis((32.43, -32.43, 25), (0, 0, -1)), mode=Mode.SUBTRACT)


solid = part.part
